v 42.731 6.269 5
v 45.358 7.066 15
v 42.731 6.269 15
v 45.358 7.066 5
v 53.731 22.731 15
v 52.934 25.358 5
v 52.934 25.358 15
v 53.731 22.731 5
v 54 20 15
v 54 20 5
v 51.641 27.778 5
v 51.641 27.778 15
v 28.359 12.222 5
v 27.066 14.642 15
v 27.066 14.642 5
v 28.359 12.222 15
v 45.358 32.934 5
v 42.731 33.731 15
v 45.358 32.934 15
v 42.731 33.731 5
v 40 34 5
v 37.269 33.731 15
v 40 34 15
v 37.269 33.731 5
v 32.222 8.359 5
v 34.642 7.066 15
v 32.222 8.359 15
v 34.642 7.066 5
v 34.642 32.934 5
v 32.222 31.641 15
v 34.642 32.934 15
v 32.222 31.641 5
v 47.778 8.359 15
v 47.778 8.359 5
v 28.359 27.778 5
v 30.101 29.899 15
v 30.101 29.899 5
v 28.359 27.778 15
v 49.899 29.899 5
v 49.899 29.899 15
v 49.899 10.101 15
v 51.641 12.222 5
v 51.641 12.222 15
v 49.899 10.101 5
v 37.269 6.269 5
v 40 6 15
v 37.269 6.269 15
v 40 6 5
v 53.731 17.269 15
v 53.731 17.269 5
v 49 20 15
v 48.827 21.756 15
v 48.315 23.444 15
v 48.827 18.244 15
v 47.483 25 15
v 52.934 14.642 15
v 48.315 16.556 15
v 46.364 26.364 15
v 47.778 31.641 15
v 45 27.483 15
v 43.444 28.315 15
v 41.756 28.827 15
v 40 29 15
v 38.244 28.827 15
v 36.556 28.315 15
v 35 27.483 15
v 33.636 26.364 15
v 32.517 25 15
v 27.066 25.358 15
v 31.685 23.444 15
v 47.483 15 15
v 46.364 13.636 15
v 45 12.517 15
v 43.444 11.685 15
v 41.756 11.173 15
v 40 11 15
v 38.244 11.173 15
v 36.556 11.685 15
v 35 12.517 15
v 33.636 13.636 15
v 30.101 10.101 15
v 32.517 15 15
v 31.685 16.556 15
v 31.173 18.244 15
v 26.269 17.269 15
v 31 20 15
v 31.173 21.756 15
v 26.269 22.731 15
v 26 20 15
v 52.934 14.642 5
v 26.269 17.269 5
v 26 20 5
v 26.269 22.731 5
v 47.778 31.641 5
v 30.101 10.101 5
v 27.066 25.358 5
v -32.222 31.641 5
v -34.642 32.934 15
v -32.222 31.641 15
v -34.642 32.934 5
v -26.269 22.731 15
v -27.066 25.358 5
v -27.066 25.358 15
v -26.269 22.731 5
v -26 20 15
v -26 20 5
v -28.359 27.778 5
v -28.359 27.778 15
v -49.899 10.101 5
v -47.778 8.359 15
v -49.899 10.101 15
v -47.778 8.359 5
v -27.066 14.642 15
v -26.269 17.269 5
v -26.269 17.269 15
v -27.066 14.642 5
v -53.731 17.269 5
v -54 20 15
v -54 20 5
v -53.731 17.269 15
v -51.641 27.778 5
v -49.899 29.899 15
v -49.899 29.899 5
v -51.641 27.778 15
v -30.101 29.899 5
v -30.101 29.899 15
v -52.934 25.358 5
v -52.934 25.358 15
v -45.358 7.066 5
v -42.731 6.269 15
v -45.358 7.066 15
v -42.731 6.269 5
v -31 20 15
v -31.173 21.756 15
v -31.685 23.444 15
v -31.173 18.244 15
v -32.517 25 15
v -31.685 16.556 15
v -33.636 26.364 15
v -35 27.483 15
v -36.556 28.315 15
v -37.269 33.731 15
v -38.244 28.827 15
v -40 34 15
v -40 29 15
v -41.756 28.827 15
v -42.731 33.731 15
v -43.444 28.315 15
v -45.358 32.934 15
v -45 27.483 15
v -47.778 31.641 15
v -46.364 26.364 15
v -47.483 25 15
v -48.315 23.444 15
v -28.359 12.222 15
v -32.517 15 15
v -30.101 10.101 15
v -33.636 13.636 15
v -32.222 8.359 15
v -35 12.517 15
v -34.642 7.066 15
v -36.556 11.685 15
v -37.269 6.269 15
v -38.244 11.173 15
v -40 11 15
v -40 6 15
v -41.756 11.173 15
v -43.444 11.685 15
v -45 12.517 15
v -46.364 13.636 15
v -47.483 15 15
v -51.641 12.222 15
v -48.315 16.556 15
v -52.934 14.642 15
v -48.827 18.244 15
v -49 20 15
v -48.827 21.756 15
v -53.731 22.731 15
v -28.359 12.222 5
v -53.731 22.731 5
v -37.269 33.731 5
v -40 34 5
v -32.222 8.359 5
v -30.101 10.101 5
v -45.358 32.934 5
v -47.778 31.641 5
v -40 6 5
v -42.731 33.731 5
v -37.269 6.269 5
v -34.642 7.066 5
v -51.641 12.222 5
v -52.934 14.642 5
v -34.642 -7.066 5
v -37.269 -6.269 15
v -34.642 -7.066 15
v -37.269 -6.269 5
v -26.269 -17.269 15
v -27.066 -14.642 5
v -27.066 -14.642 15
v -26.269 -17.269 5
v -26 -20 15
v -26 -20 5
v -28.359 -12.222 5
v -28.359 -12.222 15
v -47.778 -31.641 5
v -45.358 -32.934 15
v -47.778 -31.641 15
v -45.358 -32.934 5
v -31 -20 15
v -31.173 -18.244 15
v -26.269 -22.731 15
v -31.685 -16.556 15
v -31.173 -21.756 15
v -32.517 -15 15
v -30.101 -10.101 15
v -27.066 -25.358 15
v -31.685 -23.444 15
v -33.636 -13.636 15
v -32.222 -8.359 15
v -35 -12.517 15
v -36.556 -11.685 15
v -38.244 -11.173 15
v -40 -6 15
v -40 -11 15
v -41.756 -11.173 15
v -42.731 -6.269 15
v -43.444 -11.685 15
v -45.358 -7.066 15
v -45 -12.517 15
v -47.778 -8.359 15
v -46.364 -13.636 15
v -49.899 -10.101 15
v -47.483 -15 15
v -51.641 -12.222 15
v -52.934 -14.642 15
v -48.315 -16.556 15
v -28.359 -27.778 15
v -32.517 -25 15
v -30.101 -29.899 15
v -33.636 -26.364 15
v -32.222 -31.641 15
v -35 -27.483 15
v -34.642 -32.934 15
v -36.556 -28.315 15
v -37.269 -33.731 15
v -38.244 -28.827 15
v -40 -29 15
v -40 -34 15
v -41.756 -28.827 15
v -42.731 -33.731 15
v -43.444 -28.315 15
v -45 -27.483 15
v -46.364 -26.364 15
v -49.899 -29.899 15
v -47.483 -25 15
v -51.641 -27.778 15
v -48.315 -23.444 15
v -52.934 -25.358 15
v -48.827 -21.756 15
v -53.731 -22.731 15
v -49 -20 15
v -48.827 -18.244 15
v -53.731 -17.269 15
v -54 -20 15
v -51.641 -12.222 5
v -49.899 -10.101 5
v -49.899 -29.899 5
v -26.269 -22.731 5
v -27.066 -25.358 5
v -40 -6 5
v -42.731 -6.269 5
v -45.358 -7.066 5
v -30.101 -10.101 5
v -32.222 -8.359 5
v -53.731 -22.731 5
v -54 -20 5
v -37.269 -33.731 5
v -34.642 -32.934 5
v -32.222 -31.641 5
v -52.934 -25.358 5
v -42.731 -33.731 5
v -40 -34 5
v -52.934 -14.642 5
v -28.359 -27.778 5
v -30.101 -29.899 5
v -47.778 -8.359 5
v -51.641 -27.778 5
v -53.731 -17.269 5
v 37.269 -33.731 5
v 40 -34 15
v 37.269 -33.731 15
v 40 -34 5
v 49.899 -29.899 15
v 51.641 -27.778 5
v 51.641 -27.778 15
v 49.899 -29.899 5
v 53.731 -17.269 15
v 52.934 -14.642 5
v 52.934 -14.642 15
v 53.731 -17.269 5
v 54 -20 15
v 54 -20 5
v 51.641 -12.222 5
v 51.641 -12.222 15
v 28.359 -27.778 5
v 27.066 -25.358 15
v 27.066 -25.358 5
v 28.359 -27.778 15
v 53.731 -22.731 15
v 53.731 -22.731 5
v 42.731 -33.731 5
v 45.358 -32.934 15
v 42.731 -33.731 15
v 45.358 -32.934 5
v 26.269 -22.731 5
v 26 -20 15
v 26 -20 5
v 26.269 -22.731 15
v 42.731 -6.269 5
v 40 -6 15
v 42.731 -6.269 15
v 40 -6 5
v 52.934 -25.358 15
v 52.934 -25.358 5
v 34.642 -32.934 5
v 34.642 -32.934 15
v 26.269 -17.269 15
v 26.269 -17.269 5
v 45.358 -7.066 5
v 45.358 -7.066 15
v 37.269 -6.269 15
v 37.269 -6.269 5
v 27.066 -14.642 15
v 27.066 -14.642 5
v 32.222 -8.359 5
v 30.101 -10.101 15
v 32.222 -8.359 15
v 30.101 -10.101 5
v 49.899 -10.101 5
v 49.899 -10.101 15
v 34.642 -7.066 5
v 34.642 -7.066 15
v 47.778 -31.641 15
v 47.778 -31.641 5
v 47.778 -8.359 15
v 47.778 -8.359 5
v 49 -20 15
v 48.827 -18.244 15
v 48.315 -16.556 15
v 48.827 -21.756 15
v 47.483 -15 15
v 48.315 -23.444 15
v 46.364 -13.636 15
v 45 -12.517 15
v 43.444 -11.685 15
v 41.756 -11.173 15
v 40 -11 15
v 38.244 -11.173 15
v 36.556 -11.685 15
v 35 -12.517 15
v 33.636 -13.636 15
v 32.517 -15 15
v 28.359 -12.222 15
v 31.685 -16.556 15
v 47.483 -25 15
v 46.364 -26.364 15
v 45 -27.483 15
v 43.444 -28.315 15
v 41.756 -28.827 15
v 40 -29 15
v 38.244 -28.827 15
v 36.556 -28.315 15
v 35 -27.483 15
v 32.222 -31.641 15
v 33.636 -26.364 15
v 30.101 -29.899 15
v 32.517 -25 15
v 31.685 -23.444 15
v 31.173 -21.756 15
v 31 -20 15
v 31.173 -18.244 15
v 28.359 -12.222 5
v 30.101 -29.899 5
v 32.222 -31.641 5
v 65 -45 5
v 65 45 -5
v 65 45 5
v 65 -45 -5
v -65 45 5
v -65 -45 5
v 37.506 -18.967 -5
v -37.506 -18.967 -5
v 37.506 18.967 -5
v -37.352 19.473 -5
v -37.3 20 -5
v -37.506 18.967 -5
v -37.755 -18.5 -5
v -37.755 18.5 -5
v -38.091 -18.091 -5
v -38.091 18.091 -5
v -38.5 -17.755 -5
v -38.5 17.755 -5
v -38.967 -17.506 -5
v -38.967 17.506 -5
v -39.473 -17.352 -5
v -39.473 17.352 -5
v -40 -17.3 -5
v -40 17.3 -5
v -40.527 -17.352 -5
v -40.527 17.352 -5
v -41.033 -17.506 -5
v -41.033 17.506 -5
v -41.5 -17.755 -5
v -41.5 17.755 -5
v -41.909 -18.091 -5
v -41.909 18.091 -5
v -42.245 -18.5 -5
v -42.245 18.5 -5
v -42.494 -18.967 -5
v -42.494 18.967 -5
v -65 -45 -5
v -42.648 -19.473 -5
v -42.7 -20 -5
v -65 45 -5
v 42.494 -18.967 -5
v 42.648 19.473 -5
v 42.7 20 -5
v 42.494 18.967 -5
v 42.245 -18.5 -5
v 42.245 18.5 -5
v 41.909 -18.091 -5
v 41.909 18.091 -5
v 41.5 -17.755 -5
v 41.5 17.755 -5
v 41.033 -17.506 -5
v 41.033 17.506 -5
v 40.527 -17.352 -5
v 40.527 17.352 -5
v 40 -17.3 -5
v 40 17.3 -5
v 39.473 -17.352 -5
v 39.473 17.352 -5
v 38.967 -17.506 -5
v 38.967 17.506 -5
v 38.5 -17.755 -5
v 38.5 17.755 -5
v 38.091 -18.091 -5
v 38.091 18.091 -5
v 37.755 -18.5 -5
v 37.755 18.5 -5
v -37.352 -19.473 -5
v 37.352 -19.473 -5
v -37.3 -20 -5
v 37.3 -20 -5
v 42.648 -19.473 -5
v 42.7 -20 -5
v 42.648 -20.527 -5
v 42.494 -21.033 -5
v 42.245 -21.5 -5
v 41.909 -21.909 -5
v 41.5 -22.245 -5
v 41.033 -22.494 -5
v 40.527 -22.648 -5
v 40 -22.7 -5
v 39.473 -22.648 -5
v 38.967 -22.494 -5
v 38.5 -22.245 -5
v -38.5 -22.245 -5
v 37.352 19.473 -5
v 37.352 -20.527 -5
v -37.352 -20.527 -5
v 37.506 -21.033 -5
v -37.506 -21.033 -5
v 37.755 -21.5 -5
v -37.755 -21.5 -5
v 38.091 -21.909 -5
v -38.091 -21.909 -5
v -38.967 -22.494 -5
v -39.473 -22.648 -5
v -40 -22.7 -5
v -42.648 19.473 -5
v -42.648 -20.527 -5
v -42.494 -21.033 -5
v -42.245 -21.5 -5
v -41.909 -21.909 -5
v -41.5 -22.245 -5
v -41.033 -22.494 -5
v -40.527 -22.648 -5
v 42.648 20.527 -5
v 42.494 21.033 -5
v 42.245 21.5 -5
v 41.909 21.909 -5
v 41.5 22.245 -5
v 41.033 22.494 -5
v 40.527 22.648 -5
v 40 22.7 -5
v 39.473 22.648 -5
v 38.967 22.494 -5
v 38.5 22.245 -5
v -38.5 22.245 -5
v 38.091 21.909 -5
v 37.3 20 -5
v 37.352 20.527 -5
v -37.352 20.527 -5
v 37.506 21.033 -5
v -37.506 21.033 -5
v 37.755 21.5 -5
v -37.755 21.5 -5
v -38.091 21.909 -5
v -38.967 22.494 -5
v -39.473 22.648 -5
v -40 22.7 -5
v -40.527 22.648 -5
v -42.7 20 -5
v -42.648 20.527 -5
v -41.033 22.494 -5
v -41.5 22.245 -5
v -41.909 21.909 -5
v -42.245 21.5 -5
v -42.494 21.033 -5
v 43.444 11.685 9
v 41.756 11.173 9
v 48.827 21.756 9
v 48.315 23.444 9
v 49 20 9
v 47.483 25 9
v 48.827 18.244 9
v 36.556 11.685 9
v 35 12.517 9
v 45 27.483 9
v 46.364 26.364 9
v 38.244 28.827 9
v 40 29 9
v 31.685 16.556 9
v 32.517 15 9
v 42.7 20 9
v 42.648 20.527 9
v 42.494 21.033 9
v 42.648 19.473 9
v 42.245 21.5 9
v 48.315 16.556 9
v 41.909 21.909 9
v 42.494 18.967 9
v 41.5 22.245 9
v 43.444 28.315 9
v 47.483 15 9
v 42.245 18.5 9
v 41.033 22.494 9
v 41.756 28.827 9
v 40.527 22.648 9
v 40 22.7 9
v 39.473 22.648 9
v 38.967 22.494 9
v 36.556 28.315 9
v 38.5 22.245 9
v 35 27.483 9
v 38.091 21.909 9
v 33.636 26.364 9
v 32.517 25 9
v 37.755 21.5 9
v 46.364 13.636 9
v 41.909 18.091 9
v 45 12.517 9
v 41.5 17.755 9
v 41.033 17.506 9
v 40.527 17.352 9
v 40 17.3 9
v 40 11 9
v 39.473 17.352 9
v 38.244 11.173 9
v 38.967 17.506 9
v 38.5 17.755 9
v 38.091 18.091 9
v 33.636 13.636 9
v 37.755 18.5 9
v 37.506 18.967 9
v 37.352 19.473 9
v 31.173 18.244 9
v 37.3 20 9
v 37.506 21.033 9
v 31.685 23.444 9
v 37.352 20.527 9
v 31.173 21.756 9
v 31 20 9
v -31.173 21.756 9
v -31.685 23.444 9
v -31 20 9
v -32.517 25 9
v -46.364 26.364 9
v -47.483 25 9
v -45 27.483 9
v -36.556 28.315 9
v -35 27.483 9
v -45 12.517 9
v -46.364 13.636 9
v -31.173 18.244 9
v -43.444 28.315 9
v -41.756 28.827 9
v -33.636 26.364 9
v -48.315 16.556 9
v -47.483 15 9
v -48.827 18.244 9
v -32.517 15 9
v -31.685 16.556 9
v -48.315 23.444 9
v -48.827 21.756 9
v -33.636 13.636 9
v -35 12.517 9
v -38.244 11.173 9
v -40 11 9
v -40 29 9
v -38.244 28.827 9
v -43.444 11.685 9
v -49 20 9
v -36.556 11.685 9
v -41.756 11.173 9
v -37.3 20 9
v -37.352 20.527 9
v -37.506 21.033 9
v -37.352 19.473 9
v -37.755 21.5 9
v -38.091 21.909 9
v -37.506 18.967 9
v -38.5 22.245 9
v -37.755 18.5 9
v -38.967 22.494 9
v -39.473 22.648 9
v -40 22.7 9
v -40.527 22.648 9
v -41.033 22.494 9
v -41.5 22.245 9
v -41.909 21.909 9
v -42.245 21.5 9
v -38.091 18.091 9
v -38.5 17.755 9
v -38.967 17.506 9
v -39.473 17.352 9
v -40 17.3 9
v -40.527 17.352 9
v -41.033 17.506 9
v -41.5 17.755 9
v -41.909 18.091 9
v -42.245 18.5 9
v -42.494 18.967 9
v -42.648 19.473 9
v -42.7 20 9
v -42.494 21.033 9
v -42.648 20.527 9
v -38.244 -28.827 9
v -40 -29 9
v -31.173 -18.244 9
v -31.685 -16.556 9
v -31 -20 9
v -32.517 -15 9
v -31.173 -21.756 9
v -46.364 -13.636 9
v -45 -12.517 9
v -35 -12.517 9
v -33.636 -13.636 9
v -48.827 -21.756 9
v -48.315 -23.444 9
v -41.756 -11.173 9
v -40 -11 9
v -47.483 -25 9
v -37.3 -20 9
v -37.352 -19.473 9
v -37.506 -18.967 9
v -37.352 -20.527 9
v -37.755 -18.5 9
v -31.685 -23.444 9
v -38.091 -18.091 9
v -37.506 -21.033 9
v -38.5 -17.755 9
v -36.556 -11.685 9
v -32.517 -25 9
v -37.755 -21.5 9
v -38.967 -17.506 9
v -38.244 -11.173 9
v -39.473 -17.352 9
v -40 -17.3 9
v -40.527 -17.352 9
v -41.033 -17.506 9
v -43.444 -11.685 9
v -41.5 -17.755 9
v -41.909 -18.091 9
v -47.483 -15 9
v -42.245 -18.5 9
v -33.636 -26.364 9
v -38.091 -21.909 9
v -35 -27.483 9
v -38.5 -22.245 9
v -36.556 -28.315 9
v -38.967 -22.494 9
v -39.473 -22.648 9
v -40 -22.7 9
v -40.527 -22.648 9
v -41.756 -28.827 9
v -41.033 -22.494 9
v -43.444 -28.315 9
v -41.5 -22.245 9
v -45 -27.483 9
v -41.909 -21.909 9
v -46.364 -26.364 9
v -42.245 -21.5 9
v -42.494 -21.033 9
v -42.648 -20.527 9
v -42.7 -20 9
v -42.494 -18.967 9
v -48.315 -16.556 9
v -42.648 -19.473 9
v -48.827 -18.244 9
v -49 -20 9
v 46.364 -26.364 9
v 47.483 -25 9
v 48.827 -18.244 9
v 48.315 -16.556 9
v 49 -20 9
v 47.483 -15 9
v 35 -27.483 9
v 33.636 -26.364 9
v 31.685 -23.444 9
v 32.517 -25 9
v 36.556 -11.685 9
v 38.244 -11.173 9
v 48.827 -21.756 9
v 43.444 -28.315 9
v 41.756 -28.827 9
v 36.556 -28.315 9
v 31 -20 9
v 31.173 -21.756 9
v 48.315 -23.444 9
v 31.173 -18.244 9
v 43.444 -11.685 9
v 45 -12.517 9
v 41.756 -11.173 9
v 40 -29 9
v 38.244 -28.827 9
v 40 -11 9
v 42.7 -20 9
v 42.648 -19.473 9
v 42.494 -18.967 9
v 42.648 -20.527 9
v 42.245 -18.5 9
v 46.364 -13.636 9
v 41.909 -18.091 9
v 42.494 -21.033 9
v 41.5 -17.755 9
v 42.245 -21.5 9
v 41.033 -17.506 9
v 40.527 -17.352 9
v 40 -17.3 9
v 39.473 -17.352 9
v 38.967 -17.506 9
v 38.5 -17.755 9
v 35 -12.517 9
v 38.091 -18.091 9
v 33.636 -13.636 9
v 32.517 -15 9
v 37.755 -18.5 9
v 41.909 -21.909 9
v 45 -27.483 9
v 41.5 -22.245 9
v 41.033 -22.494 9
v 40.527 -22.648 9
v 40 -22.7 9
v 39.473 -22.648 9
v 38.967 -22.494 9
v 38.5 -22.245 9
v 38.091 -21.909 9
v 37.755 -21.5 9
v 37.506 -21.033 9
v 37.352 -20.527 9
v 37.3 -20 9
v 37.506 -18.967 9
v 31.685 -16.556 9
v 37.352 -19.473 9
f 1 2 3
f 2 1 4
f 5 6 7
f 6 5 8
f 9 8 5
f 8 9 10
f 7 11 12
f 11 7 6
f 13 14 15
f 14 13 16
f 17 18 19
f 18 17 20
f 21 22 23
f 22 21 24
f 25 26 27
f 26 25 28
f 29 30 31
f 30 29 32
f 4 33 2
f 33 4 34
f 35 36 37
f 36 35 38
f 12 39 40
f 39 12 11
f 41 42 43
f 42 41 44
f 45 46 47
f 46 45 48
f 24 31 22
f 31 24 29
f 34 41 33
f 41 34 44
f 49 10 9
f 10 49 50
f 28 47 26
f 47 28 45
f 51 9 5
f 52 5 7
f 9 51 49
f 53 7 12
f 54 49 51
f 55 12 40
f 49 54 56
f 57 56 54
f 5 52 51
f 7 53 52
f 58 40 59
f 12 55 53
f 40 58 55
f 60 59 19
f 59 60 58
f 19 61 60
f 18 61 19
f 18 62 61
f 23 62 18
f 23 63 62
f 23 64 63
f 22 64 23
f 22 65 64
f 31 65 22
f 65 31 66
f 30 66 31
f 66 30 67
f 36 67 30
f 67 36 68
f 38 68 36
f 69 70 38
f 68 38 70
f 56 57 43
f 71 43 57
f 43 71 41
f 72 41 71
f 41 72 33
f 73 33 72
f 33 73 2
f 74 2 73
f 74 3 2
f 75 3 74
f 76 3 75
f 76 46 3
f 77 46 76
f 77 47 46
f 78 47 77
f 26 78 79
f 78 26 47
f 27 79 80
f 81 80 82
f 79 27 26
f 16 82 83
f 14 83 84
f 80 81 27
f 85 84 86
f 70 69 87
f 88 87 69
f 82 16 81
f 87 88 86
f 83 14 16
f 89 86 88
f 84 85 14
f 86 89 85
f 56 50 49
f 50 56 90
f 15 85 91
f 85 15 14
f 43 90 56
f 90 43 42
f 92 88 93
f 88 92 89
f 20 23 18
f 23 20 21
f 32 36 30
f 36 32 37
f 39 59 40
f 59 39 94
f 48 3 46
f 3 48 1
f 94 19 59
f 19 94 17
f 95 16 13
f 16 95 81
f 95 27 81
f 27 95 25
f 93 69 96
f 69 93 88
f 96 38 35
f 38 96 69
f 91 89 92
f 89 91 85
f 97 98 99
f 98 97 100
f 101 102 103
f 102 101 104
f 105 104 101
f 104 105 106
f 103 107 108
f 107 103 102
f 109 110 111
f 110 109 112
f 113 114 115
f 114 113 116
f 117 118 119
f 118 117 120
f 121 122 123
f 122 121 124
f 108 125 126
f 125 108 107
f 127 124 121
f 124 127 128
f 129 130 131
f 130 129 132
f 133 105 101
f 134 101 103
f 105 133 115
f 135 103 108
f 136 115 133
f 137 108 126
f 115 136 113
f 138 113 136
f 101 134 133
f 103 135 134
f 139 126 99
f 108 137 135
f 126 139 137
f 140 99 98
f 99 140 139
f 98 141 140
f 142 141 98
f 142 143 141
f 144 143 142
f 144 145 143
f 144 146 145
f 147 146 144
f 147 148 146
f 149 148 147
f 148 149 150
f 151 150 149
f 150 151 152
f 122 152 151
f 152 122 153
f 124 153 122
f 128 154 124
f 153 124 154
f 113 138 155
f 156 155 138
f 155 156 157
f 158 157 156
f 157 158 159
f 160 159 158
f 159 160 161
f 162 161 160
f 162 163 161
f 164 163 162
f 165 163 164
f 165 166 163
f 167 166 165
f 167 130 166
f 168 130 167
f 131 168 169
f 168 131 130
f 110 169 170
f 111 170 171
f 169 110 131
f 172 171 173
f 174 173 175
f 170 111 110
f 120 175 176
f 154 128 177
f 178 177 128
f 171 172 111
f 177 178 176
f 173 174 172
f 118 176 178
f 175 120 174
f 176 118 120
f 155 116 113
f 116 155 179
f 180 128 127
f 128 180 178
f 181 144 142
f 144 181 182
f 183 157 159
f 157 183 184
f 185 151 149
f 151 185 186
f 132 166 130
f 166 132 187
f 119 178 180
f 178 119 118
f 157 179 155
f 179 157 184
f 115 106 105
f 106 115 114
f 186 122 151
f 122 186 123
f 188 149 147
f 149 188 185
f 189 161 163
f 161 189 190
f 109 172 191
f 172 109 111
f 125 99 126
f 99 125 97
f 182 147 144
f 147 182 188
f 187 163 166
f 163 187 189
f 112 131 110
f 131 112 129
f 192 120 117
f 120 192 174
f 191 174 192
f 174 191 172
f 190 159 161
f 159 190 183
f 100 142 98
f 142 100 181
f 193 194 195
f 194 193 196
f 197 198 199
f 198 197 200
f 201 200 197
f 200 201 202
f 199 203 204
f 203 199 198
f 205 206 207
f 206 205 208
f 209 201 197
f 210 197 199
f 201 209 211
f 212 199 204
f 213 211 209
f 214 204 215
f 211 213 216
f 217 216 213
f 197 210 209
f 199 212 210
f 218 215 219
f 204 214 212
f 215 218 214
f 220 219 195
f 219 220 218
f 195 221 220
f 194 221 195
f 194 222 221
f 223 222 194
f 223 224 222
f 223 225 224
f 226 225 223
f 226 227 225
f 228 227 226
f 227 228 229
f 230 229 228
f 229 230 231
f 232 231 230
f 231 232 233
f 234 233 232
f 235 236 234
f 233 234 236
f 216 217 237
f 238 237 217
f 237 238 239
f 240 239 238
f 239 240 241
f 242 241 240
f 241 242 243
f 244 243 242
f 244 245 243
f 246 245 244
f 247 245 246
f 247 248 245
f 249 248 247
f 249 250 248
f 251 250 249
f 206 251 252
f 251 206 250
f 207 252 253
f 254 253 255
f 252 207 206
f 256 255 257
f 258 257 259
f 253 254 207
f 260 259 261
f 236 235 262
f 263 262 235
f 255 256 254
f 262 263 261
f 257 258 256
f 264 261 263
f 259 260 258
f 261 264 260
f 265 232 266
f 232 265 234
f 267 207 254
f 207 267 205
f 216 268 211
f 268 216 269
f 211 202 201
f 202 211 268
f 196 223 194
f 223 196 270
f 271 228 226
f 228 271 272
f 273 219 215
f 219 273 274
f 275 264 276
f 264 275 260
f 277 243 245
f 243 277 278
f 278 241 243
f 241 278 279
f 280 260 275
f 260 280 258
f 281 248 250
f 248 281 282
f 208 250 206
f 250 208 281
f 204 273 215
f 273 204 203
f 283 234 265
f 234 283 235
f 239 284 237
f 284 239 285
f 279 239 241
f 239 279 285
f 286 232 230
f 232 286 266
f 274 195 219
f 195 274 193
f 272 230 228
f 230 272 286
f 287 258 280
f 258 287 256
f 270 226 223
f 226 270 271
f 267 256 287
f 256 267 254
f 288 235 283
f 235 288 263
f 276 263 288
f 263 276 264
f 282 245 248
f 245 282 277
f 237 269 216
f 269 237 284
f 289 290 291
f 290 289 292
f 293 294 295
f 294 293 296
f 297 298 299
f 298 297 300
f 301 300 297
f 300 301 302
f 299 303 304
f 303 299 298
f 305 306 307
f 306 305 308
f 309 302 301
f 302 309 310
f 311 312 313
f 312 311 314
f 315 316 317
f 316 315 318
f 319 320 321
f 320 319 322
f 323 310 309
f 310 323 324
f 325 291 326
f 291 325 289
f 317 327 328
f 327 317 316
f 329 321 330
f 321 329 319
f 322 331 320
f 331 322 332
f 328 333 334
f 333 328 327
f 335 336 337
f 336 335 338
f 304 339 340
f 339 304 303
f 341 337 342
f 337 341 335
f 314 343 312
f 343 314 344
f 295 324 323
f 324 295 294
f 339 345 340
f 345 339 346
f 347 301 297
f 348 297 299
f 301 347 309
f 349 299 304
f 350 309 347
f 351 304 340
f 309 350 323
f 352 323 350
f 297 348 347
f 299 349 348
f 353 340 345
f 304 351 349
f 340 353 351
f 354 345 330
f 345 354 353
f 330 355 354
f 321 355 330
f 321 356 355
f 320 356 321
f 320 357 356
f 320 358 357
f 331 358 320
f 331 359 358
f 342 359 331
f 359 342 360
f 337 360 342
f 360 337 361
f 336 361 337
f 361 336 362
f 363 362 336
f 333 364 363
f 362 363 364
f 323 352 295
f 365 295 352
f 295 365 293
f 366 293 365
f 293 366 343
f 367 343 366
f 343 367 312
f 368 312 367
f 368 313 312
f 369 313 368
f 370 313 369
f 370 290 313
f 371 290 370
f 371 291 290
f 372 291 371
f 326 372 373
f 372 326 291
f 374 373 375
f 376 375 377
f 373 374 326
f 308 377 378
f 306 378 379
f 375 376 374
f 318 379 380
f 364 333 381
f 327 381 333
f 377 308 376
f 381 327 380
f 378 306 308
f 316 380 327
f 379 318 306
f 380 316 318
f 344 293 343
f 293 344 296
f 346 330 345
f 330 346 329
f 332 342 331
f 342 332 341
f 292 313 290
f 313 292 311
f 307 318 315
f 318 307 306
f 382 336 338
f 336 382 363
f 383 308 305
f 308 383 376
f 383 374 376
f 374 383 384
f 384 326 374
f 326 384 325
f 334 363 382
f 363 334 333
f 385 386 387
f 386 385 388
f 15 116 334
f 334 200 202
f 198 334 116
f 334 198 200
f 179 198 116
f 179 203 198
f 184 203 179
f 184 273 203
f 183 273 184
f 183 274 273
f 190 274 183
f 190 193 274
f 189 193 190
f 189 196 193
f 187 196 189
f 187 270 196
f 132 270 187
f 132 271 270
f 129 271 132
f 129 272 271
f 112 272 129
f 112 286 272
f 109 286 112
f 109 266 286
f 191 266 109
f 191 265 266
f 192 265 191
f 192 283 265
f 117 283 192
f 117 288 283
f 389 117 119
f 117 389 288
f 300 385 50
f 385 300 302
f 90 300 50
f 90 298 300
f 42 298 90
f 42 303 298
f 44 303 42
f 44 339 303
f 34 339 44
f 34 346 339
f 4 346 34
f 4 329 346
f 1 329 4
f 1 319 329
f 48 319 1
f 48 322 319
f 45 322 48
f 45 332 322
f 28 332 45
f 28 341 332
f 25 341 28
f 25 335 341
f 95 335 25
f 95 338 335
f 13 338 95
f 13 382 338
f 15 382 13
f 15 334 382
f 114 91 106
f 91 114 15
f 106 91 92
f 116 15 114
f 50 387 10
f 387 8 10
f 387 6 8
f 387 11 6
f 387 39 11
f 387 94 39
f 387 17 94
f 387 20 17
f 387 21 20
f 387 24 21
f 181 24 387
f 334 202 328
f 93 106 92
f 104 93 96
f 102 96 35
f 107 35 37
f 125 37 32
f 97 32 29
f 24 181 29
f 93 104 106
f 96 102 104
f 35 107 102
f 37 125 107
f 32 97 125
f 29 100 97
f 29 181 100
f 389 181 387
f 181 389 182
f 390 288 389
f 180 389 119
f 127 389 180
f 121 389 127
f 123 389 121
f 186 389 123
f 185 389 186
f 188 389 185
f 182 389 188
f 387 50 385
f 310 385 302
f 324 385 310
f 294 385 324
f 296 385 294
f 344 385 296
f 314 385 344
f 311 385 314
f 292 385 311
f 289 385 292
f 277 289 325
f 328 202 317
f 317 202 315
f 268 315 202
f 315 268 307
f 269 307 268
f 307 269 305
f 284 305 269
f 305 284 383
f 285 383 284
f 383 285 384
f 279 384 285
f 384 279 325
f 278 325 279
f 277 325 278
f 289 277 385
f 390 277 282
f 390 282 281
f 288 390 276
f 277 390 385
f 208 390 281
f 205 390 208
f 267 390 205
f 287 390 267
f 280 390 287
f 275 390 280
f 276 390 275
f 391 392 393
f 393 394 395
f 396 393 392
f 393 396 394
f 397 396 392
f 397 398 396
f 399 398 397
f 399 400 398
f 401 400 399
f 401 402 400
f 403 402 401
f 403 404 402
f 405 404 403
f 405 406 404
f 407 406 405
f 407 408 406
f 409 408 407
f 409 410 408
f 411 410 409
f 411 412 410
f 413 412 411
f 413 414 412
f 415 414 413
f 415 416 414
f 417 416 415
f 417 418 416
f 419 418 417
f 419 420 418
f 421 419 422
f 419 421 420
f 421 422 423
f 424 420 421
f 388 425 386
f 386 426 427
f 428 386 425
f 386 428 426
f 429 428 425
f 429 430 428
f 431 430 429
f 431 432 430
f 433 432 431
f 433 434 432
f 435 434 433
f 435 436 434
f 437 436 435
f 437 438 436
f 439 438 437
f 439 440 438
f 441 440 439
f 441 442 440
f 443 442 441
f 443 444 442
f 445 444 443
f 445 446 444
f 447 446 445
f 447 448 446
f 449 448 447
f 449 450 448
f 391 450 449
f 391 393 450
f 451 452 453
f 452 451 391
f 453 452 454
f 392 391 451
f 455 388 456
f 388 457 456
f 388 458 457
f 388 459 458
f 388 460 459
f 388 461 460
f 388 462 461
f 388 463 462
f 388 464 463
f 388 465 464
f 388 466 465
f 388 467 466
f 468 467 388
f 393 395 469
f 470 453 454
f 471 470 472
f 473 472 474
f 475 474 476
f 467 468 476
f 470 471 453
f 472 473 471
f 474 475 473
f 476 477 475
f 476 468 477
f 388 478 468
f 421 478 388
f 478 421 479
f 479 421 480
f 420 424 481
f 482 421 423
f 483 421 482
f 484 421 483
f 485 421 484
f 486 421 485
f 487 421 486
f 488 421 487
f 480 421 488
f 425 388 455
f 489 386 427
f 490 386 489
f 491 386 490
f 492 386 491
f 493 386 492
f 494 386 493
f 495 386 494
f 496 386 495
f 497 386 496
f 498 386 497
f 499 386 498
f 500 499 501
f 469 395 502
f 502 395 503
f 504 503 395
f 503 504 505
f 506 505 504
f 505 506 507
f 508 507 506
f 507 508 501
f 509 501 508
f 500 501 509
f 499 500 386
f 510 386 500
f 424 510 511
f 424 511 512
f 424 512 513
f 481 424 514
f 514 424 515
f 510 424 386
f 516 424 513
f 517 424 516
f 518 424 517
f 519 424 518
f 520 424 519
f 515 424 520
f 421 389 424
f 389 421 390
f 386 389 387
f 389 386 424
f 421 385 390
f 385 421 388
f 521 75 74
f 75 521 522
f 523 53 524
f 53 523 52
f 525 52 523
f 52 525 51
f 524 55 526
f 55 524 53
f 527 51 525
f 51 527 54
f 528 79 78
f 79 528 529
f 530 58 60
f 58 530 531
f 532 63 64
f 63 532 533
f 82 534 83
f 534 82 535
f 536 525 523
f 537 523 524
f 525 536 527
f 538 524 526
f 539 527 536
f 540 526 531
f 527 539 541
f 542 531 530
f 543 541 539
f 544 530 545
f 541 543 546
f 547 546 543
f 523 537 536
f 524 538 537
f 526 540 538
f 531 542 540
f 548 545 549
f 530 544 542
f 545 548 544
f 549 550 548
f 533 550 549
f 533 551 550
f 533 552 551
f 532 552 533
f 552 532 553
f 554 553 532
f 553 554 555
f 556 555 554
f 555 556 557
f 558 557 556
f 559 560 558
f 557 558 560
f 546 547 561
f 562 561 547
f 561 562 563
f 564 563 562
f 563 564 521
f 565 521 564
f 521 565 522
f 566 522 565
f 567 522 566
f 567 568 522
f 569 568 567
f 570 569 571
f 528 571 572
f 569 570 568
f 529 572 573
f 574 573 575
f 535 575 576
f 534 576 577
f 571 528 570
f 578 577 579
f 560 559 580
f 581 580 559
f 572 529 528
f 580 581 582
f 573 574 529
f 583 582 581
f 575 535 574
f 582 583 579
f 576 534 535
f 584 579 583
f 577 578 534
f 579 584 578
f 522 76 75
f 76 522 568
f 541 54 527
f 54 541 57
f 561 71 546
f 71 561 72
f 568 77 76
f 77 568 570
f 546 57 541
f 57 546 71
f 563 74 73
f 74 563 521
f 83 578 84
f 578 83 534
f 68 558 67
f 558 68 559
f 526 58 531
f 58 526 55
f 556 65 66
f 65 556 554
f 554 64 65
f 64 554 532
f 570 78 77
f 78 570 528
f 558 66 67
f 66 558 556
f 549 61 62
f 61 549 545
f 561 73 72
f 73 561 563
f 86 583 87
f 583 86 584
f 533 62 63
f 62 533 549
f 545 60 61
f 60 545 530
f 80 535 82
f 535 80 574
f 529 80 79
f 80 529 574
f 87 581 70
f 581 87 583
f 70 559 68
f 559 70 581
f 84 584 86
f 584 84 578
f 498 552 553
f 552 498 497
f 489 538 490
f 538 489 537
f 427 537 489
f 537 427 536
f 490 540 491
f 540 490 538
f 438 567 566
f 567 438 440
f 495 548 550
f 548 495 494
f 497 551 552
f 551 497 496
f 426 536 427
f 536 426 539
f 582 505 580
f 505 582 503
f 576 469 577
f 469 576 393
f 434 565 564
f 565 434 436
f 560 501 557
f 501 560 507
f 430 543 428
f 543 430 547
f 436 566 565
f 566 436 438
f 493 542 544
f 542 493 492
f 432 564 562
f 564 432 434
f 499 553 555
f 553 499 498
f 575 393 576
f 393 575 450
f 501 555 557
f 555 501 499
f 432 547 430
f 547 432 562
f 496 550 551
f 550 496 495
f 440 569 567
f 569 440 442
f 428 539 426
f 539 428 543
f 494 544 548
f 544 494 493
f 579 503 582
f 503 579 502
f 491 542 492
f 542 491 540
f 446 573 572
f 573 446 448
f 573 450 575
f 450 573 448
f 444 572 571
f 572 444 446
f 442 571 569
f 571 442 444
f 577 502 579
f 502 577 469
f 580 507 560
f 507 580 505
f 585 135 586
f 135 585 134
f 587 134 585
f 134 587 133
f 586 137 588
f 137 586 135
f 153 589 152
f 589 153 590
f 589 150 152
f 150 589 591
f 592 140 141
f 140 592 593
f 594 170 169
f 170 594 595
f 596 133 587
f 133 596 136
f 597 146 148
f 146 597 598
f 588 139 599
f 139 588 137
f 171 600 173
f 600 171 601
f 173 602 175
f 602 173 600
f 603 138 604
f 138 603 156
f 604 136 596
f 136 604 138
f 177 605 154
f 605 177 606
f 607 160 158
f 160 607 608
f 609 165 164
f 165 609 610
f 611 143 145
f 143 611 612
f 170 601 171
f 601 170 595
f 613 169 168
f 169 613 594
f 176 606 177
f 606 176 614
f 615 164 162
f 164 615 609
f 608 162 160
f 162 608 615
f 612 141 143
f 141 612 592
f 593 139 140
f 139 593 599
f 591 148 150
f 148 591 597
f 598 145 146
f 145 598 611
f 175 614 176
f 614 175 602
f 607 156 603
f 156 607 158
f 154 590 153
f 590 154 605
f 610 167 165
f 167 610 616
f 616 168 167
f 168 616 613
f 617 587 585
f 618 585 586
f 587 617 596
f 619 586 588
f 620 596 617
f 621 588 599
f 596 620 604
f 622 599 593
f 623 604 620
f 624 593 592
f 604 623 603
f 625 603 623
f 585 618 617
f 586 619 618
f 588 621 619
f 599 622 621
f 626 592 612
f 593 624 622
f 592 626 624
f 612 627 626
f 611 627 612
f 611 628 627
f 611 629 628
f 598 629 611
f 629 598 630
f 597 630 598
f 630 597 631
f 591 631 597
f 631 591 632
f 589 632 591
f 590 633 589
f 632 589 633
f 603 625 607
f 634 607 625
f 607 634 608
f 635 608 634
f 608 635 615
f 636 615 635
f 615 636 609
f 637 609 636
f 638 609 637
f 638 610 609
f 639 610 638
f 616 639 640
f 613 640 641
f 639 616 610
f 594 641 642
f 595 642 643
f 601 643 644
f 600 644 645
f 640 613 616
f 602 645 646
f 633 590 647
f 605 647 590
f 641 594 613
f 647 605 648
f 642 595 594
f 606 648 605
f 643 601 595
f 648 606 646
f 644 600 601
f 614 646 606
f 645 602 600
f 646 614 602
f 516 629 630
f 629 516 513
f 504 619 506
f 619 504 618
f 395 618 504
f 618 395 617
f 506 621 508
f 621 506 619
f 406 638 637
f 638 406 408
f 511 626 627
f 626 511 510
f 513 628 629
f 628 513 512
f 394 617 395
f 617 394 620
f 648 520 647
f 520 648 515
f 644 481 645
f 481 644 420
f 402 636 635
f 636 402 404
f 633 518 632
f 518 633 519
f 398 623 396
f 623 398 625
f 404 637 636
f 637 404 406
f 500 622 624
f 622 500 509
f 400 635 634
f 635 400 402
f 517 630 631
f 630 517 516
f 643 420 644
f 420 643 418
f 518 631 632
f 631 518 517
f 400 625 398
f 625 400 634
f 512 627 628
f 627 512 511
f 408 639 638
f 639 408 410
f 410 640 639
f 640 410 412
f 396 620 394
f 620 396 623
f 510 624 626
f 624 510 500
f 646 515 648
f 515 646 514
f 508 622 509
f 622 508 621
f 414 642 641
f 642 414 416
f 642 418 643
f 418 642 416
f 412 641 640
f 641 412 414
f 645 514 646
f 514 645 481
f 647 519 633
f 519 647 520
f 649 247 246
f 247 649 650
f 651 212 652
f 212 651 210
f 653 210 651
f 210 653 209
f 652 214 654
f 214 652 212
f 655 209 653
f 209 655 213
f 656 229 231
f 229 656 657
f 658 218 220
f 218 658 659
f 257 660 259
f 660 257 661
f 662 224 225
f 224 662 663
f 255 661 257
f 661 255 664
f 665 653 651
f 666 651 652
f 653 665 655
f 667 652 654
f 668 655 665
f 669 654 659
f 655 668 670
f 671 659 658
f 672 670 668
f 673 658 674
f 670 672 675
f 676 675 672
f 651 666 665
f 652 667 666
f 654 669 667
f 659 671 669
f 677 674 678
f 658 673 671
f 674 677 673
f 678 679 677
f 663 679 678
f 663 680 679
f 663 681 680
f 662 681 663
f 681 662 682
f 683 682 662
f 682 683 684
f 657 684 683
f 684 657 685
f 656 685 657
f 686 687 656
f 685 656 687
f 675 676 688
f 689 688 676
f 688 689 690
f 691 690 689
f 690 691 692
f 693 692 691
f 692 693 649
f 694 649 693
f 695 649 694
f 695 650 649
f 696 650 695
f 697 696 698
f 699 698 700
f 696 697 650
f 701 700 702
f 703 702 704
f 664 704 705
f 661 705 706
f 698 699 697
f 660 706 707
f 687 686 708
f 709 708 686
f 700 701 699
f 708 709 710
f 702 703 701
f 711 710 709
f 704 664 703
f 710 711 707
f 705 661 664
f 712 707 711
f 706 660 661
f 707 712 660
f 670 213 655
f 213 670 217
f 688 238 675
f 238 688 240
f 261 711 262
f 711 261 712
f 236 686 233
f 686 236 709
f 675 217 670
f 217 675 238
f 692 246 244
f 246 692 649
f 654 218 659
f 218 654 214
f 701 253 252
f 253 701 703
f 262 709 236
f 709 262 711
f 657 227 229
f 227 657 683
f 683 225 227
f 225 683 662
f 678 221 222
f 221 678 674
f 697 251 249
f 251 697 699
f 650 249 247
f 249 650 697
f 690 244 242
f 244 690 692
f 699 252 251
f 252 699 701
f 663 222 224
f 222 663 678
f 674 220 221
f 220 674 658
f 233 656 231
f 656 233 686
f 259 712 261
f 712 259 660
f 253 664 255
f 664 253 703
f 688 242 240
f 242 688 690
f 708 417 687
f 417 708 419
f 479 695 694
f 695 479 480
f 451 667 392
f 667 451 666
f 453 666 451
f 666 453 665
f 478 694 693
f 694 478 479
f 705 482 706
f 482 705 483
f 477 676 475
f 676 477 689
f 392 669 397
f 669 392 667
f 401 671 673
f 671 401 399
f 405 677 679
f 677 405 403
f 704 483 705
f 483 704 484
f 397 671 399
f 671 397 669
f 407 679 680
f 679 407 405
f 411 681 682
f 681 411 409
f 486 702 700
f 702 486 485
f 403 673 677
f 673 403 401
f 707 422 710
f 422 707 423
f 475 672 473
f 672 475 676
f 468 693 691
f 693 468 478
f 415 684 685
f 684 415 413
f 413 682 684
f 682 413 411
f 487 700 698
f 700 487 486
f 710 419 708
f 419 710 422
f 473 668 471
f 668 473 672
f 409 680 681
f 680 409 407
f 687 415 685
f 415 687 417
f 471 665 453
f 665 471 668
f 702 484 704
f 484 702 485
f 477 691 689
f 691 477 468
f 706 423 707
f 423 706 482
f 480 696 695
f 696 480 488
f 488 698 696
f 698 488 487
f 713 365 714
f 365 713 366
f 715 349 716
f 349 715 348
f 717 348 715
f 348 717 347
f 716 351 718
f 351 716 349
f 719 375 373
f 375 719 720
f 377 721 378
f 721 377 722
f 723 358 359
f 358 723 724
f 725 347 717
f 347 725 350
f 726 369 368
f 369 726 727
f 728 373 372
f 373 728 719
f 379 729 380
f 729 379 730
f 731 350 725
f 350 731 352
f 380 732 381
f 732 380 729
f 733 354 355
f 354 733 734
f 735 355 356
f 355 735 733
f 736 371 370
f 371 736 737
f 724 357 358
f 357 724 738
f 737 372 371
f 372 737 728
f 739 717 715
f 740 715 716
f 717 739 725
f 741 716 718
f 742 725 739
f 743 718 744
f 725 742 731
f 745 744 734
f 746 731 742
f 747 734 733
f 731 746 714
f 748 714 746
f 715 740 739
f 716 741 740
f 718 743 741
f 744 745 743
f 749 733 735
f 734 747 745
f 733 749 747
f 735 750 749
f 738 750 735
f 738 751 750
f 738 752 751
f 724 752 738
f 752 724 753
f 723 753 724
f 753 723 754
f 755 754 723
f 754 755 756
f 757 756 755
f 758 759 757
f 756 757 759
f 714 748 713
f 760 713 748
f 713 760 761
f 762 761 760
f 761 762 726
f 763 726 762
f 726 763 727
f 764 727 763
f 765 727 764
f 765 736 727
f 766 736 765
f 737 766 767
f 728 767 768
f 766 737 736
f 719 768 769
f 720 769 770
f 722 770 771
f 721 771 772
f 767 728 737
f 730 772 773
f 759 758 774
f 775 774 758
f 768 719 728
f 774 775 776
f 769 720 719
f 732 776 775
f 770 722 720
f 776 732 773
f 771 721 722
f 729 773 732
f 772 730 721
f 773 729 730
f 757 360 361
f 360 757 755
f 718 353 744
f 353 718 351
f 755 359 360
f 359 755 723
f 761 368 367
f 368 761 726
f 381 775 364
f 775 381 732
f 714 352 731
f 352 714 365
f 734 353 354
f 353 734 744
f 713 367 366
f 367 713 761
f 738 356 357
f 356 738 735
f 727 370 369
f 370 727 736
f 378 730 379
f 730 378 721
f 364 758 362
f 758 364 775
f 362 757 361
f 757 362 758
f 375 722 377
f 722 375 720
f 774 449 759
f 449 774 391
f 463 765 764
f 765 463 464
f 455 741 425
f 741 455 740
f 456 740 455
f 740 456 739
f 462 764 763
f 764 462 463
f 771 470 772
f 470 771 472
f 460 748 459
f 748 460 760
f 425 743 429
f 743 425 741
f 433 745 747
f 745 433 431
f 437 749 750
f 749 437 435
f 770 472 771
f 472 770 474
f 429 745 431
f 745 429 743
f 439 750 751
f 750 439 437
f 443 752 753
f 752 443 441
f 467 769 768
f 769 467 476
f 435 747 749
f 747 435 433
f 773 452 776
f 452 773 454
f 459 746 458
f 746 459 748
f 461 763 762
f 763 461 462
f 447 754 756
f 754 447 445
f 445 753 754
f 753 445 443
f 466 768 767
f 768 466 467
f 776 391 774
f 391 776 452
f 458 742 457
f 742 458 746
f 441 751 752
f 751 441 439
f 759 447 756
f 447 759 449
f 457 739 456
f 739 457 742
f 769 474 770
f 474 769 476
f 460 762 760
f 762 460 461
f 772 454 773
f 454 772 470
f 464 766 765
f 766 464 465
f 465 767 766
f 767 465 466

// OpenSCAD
$fn = 32;

// ----------------------------------------------------------------------
// Socket pad plate
// bosses with counterbored sockets for the screws
// ----------------------------------------------------------------------

// --- parameters (mm) ---
base_t = 10;            // base plate thickness
boss_h = 10;            // boss height above the base plate
boss_d = 28;            // boss diameter
socket_d = 18;          // socket diameter
socket_depth = 6;       // socket depth from the boss face
bolt_d = 5.4;           // screw clearance hole through the socket floor
plate = [130, 90, 10];  // overall size (x, y, z)
edge = 25;              // boss centre offset from the plate edge
pads = 4;               // boss count, one per corner

// --- derived feature positions (mm) ---
height = base_t + boss_h;        // = 20   overall height of the part
corner_x = plate[0] / 2 - edge;  // = 40   boss centre X
corner_y = plate[1] / 2 - edge;  // = 20   boss centre Y
feature_centers = [
  [corner_x, corner_y],
  [-corner_x, corner_y],
  [-corner_x, -corner_y],
  [corner_x, -corner_y]
];   // boss centres: sockets, holes and the pads themselves are placed from here

// base plate, bosses on feature_centers, socket + through hole in each
difference() {
  union() {
    cube(plate, center = true);
    for (centre = feature_centers)
      translate([centre[0], centre[1], plate[2] / 2 - 1])
        cylinder(d = boss_d, h = boss_h + 1);
  }
  for (centre = feature_centers) {
    translate([centre[0], centre[1], plate[2] / 2 + boss_h - socket_depth])
      cylinder(d = socket_d, h = socket_depth + 1);
    translate([centre[0], centre[1], -height])
      cylinder(d = bolt_d, h = 2 * height + 2);  // through the socket floor
  }
}
